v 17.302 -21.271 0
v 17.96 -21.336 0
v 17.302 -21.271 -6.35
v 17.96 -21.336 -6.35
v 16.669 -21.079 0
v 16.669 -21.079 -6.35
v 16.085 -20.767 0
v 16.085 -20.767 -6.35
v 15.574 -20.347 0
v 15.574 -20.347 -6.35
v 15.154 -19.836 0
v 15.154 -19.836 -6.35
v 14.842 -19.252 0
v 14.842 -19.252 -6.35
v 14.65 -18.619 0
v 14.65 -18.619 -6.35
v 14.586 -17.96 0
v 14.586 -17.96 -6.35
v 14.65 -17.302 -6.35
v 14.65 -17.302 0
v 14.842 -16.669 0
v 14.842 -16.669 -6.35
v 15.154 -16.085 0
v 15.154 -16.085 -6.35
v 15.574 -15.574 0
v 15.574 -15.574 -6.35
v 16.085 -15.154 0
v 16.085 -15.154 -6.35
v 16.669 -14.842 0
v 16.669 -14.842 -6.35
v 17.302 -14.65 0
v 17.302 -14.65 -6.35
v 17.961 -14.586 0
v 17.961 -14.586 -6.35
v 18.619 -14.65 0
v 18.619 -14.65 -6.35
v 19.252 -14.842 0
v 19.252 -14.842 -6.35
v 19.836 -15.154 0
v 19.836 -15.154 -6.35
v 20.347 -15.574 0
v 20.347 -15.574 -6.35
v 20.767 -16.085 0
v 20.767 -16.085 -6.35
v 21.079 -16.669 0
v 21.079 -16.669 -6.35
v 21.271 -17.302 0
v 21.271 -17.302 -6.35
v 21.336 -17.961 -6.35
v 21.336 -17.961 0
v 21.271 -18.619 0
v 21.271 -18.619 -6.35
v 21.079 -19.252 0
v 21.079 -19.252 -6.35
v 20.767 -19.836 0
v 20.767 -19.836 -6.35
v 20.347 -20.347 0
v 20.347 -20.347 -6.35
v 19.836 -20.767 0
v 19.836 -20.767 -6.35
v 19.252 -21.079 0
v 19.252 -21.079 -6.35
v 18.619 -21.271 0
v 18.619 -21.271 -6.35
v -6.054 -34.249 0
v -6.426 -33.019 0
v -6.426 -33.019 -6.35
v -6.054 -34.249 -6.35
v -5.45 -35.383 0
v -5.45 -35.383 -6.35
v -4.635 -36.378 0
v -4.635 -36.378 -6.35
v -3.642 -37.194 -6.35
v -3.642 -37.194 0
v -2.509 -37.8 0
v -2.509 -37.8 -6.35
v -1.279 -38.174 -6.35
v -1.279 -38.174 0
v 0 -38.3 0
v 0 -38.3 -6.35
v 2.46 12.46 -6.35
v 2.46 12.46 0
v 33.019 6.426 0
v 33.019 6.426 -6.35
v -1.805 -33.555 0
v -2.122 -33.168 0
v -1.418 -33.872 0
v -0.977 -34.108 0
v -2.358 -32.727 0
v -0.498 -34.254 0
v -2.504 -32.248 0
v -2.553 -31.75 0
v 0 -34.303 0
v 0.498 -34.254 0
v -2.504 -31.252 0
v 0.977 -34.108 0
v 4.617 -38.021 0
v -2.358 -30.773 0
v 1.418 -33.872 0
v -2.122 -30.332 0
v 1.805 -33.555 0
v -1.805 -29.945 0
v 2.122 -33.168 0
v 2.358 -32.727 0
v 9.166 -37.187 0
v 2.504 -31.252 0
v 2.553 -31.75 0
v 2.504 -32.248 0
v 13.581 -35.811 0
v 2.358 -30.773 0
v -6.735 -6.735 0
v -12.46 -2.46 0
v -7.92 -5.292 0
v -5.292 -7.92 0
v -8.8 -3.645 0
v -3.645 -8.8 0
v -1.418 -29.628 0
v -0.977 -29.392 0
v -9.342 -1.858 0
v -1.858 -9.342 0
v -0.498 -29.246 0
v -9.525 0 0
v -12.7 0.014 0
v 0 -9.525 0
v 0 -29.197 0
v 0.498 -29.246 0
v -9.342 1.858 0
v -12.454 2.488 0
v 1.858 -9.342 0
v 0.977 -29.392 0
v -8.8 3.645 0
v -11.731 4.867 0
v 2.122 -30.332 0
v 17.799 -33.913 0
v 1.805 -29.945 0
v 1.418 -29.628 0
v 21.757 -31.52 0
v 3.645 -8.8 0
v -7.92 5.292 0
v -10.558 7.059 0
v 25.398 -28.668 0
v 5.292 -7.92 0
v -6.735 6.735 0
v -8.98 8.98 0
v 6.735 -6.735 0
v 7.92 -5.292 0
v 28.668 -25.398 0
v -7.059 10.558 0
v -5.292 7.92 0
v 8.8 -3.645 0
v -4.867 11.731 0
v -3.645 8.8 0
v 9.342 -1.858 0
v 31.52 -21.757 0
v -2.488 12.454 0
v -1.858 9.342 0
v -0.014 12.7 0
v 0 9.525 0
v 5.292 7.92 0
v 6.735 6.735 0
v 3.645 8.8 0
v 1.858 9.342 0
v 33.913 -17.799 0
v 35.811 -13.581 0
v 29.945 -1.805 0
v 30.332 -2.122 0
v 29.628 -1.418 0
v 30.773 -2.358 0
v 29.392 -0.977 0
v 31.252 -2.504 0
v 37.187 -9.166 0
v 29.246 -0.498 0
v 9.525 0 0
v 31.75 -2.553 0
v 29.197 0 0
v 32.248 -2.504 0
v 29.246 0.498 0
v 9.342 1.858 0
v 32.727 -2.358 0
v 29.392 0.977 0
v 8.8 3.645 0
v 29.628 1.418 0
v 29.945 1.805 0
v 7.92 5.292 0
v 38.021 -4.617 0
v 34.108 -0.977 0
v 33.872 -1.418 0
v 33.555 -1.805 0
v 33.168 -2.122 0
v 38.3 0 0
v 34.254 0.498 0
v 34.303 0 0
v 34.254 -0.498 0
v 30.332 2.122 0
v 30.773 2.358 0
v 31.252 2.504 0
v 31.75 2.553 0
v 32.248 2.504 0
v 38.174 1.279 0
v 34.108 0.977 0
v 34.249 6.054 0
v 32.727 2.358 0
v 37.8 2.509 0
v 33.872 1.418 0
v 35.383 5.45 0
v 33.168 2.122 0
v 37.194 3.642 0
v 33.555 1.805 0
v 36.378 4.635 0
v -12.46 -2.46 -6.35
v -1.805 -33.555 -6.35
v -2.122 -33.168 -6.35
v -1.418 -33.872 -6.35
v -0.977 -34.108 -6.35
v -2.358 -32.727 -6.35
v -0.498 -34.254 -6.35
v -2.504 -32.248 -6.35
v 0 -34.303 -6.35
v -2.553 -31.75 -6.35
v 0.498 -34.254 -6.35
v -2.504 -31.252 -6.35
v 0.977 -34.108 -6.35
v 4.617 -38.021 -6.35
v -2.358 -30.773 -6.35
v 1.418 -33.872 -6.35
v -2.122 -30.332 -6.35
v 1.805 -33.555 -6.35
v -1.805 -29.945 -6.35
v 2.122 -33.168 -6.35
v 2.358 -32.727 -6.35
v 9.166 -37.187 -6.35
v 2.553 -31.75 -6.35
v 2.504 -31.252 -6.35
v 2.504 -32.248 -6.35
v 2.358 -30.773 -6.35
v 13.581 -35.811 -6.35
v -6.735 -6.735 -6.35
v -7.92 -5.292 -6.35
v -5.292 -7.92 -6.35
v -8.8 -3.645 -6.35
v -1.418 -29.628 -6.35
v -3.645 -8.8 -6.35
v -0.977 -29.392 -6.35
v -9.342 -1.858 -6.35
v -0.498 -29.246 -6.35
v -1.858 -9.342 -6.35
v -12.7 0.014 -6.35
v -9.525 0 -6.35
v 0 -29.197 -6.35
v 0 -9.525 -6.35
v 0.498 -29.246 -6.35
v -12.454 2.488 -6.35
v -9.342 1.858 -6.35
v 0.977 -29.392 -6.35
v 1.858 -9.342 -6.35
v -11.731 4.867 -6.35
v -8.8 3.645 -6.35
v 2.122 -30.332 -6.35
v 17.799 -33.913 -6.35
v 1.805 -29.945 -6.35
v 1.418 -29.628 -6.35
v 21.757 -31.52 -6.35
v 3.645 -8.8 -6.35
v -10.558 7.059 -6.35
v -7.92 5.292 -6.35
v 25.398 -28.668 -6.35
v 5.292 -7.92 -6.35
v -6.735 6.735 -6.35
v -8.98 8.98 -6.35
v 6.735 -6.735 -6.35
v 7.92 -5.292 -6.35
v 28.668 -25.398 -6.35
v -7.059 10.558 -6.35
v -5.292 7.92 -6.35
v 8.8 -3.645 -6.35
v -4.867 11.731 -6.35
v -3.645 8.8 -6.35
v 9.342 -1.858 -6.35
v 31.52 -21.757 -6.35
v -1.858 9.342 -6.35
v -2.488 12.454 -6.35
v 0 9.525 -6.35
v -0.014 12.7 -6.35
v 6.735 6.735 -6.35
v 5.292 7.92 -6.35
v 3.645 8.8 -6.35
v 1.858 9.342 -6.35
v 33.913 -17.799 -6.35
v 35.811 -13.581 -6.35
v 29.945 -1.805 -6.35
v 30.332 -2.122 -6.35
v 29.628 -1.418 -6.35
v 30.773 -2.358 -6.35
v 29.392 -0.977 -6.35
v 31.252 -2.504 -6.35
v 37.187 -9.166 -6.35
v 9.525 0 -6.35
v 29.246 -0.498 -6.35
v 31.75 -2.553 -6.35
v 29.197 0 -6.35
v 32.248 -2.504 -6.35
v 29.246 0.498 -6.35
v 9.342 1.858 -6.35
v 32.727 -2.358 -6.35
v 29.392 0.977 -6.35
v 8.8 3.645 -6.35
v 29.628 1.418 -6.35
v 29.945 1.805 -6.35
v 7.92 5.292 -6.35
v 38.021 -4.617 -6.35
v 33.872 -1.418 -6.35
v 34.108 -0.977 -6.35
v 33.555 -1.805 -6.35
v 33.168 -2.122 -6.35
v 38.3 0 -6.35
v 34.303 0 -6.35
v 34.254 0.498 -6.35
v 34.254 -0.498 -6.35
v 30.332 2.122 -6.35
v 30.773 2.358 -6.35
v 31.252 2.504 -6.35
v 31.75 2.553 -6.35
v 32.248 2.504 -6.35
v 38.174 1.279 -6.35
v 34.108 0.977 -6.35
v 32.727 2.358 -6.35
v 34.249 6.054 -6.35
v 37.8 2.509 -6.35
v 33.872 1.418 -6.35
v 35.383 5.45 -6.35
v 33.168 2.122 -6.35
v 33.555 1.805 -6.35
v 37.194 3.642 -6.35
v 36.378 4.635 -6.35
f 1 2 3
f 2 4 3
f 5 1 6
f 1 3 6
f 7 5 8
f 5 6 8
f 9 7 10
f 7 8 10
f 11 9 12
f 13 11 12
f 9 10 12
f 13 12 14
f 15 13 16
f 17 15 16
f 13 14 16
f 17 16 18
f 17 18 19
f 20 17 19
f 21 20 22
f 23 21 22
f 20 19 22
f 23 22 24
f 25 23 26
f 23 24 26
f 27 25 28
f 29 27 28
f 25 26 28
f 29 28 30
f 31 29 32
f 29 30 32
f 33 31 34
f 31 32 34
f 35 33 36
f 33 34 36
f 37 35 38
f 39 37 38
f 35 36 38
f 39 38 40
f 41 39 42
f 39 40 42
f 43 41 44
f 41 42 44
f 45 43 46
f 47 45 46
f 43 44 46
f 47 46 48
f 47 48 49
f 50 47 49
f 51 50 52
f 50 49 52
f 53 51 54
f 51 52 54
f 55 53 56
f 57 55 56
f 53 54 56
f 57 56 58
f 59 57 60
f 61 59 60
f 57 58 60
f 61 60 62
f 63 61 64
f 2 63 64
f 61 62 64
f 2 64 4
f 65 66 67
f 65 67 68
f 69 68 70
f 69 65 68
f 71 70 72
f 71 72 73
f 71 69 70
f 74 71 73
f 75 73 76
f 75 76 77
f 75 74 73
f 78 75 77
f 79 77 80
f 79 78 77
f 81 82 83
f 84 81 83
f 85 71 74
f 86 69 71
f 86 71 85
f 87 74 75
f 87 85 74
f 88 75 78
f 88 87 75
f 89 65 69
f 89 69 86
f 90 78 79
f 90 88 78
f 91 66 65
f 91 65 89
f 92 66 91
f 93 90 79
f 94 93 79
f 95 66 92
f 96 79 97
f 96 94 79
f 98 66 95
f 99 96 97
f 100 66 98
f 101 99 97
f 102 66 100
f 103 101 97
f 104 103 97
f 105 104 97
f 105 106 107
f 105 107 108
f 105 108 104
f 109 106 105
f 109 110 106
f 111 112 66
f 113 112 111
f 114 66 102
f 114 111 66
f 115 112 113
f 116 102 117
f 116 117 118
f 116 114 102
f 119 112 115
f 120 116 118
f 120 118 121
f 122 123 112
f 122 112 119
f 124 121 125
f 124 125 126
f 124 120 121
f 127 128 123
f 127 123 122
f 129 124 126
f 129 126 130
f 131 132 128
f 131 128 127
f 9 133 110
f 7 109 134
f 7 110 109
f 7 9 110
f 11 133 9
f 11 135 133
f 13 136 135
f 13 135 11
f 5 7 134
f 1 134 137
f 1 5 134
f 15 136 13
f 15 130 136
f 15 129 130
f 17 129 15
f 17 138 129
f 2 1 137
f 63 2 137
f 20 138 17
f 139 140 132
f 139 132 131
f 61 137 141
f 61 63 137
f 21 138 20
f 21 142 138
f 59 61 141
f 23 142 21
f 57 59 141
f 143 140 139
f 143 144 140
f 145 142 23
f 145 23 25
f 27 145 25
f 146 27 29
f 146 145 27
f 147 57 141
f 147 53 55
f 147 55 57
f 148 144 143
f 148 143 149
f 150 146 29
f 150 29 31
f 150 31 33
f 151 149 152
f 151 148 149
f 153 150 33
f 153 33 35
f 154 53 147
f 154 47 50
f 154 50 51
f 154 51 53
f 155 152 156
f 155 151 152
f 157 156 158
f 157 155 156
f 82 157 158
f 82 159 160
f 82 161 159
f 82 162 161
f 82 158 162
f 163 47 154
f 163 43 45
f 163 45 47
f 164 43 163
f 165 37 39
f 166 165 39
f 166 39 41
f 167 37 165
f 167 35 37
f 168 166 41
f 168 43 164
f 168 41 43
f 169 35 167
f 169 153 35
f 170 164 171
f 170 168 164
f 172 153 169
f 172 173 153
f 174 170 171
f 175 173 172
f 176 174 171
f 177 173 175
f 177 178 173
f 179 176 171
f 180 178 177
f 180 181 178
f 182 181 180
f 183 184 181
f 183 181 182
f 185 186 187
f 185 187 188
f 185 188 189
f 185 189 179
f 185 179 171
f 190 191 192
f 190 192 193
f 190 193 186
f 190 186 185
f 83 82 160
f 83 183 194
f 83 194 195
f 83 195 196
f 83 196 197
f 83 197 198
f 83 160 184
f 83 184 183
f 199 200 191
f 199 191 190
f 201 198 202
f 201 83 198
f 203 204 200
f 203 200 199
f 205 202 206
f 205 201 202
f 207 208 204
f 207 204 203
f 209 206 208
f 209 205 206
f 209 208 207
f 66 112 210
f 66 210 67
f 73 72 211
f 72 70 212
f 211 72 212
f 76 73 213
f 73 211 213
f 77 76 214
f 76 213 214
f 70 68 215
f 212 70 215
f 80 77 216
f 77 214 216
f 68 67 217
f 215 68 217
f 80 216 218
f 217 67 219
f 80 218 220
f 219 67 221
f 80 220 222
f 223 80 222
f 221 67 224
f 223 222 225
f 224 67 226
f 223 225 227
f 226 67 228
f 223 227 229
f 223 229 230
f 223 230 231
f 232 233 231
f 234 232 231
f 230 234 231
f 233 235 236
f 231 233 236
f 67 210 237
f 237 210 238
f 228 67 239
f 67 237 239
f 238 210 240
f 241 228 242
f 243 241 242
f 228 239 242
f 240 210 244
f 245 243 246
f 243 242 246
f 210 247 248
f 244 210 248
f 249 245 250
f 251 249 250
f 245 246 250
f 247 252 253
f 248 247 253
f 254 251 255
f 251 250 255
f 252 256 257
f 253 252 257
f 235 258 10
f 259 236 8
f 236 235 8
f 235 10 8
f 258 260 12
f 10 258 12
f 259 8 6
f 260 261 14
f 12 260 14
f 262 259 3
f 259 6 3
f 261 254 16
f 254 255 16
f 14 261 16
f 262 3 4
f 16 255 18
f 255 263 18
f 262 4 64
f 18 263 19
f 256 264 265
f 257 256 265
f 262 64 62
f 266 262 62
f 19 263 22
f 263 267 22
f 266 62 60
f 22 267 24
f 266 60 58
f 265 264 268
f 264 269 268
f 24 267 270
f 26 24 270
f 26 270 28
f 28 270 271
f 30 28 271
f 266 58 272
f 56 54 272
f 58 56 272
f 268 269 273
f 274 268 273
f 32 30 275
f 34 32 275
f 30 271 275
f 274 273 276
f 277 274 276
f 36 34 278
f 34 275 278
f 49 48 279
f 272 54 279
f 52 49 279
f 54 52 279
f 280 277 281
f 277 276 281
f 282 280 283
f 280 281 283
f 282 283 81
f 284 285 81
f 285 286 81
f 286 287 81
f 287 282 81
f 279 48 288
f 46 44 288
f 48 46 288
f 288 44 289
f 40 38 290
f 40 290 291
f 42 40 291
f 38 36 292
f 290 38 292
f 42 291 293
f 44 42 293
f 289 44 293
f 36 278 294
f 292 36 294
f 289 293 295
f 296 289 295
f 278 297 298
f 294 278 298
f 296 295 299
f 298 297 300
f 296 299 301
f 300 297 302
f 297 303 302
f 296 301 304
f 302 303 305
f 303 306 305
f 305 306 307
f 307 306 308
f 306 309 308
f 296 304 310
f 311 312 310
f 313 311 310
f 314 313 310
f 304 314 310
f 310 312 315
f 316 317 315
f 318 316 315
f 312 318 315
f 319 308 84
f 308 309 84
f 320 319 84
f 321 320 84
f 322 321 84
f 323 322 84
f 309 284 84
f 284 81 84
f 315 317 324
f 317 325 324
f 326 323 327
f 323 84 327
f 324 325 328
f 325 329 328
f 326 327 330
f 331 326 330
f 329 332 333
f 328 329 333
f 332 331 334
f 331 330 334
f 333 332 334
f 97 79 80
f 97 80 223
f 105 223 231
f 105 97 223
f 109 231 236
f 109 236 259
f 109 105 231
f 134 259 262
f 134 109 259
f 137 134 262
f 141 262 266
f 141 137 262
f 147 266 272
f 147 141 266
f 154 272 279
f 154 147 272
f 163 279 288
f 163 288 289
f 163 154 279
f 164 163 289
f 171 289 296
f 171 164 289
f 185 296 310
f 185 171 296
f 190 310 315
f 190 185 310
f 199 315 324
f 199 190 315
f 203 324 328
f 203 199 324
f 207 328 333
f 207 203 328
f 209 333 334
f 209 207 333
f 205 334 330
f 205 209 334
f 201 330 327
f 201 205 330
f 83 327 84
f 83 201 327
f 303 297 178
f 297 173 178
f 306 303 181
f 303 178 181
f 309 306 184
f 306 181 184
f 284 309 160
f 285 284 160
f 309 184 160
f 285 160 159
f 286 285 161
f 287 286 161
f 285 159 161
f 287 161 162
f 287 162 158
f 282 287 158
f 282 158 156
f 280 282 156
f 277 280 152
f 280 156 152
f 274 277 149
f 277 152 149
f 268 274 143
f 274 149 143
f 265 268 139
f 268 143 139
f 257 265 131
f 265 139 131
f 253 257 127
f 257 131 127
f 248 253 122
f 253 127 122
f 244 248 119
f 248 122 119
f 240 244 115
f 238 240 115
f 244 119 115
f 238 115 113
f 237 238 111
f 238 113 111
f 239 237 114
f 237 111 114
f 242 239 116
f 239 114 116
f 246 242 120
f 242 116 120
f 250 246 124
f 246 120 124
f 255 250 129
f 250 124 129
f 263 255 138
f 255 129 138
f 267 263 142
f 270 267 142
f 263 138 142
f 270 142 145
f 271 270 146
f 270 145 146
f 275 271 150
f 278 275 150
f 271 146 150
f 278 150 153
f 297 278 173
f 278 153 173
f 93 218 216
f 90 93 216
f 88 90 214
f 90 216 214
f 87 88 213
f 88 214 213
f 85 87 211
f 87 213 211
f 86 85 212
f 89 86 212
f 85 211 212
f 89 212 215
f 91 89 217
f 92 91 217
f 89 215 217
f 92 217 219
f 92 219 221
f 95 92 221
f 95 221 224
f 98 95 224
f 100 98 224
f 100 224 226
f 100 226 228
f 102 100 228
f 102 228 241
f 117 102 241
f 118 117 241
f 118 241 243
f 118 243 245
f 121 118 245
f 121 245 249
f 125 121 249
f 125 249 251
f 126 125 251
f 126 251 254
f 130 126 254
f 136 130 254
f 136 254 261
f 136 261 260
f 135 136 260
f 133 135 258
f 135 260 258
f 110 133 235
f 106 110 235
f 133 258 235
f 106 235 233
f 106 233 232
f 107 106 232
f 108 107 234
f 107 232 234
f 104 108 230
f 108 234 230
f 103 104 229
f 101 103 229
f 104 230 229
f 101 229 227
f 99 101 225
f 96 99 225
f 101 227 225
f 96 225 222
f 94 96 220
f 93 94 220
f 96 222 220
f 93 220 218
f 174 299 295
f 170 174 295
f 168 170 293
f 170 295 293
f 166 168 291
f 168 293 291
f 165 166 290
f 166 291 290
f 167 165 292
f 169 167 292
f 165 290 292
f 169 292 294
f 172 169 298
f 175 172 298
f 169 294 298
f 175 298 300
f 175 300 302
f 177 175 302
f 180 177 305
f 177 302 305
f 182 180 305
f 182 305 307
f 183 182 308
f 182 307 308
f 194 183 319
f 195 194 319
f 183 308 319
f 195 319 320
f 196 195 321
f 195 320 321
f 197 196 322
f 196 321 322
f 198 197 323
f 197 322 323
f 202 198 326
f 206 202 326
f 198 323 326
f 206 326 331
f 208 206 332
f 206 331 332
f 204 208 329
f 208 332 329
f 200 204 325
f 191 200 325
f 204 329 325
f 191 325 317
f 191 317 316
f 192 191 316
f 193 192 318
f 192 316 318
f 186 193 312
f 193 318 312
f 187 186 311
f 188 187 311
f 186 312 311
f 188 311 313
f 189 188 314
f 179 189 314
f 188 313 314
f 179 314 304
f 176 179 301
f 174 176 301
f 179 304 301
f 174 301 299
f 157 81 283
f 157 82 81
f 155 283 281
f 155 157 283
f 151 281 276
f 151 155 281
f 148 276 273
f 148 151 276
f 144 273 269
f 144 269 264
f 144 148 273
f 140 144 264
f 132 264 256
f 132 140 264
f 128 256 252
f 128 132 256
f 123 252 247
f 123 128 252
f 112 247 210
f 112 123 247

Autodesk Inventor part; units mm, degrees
ref_plane "YZ Plane" through (0, 0, 0) normal (1, 0, 0) x (0, 1, 0)
ref_plane "XZ Plane" through (0, 0, 0) normal (0, 1, 0) x (-1, 0, 0)
ref_plane "XY Plane" through (0, 0, 0) normal (0, 0, 1) x (1, 0, 0)
sketch "Sketch1" plane through (0, 0, 0) normal (0, 0, 1) x (1, 0, 0)
  circle A0 centre (0, 0) radius 31.75 construction
  circle A1 centre (0, 0) radius 11.176 construction
  line L0 (0, 0) -> (17.9605, -17.9605) construction
  line L1 (0, 0) -> (0, -31.75) construction
  circle A2 centre (17.9605, -17.9605) radius 6.55 construction
  circle A3 centre (0, 31.75) radius 6.55 construction
  circle A4 centre (0, -31.75) radius 6.55 construction
  circle A5 centre (31.75, 0) radius 6.55 construction
  circle A6 centre (-31.75, 0) radius 6.55 construction
  circle A7 centre (0, 0) radius 25.2 construction
  circle A8 centre (0, 0) radius 38.3 construction
  arc A9 (0, -25.2) -> (12.6501, -21.7948) centre (0, 0) ccw
  arc A10 (0, -25.2) -> (0, -38.3) centre (0, -31.75) ccw
  arc A11 (0, -38.3) -> (38.3, 0) centre (0, 0) ccw
  arc A12 (38.3, 0) -> (25.2, 0) centre (31.75, 0) ccw
  arc A13 (21.7948, -12.6501) -> (25.2, 0) centre (0, 0) ccw
  arc A14 (21.7948, -12.6501) -> (12.6501, -21.7948) centre (17.9605, -17.9605) ccw
  dimension "d0" = 63.5
  dimension "d1" = 22.352
  dimension "d3" = 25.4
  dimension "d4" = 45
  dimension "d5" = 13.1
  dimension "d6" = 13.1
  dimension "d7" = 13.1
  dimension "d8" = 13.1
  dimension "d9" = 13.1
  dimension "d10" = 6.55
  dimension "d11" = 13.1
extrude "Extrusion1" add sketch "Sketch1" against normal blind 6.35
hole "Hole1" at (0, 31.75, 0) at (17.9605, -17.9605, 0) direction (0, 0, -1) diameter 6.75 depth 9.525
sketch "Sketch2" plane through (0, 0, 0) normal (0, 0, 1) x (1, 0, 0)
  circle A0 centre (17.9605, -17.9605) radius 3.375 construction
  arc A1 (21.7948, -12.6501) -> (25.2, 0) centre (0, 0) ccw projected
  arc A2 (38.3, 0) -> (25.2, 0) centre (31.75, 0) ccw projected
  arc A3 (0, -38.3) -> (38.3, 0) centre (0, 0) ccw construction
  arc A4 (0, -25.2) -> (0, -38.3) centre (0, -31.75) ccw projected
  arc A5 (0, -25.2) -> (12.6501, -21.7948) centre (0, 0) ccw projected
  arc A6 (21.7948, -12.6501) -> (12.6501, -21.7948) centre (17.9605, -17.9605) ccw projected
  circle A7 centre (0, 0) radius 12.7
  line L0 (-12.4595, -2.46) -> (-6.4259, -33.0187)
  arc A8 (0, -25.2) -> (0, -38.3) centre (0, -31.75) ccw construction
  line L1 (2.46, 12.4595) -> (33.0187, 6.4259)
  circle A9 centre (0, 0) radius 9.525
  dimension "d23" = 3.175
  dimension "d24" = 19.05
extrude "Extrusion2" add sketch "Sketch2" against normal blind 6.35
hole "Hole2" at (0, -31.75, 0) at (31.75, 0, 0) direction (0, 0, -1) diameter 5.1054 depth 9.525 clearance for "Flat Head Machine Screw (82)" size "#10" standard "Ansi Unified Screw Threads"
equation "\"d6\" = d5"
equation "\"d7\" = d5"
equation "\"d8\" = d5"
equation "\"d9\" = d5"
equation "\"d10\" = 0.5 * d5"
equation "\"d11\" = d5"
properties part number "CL7-018" material "ABS Plastic"
